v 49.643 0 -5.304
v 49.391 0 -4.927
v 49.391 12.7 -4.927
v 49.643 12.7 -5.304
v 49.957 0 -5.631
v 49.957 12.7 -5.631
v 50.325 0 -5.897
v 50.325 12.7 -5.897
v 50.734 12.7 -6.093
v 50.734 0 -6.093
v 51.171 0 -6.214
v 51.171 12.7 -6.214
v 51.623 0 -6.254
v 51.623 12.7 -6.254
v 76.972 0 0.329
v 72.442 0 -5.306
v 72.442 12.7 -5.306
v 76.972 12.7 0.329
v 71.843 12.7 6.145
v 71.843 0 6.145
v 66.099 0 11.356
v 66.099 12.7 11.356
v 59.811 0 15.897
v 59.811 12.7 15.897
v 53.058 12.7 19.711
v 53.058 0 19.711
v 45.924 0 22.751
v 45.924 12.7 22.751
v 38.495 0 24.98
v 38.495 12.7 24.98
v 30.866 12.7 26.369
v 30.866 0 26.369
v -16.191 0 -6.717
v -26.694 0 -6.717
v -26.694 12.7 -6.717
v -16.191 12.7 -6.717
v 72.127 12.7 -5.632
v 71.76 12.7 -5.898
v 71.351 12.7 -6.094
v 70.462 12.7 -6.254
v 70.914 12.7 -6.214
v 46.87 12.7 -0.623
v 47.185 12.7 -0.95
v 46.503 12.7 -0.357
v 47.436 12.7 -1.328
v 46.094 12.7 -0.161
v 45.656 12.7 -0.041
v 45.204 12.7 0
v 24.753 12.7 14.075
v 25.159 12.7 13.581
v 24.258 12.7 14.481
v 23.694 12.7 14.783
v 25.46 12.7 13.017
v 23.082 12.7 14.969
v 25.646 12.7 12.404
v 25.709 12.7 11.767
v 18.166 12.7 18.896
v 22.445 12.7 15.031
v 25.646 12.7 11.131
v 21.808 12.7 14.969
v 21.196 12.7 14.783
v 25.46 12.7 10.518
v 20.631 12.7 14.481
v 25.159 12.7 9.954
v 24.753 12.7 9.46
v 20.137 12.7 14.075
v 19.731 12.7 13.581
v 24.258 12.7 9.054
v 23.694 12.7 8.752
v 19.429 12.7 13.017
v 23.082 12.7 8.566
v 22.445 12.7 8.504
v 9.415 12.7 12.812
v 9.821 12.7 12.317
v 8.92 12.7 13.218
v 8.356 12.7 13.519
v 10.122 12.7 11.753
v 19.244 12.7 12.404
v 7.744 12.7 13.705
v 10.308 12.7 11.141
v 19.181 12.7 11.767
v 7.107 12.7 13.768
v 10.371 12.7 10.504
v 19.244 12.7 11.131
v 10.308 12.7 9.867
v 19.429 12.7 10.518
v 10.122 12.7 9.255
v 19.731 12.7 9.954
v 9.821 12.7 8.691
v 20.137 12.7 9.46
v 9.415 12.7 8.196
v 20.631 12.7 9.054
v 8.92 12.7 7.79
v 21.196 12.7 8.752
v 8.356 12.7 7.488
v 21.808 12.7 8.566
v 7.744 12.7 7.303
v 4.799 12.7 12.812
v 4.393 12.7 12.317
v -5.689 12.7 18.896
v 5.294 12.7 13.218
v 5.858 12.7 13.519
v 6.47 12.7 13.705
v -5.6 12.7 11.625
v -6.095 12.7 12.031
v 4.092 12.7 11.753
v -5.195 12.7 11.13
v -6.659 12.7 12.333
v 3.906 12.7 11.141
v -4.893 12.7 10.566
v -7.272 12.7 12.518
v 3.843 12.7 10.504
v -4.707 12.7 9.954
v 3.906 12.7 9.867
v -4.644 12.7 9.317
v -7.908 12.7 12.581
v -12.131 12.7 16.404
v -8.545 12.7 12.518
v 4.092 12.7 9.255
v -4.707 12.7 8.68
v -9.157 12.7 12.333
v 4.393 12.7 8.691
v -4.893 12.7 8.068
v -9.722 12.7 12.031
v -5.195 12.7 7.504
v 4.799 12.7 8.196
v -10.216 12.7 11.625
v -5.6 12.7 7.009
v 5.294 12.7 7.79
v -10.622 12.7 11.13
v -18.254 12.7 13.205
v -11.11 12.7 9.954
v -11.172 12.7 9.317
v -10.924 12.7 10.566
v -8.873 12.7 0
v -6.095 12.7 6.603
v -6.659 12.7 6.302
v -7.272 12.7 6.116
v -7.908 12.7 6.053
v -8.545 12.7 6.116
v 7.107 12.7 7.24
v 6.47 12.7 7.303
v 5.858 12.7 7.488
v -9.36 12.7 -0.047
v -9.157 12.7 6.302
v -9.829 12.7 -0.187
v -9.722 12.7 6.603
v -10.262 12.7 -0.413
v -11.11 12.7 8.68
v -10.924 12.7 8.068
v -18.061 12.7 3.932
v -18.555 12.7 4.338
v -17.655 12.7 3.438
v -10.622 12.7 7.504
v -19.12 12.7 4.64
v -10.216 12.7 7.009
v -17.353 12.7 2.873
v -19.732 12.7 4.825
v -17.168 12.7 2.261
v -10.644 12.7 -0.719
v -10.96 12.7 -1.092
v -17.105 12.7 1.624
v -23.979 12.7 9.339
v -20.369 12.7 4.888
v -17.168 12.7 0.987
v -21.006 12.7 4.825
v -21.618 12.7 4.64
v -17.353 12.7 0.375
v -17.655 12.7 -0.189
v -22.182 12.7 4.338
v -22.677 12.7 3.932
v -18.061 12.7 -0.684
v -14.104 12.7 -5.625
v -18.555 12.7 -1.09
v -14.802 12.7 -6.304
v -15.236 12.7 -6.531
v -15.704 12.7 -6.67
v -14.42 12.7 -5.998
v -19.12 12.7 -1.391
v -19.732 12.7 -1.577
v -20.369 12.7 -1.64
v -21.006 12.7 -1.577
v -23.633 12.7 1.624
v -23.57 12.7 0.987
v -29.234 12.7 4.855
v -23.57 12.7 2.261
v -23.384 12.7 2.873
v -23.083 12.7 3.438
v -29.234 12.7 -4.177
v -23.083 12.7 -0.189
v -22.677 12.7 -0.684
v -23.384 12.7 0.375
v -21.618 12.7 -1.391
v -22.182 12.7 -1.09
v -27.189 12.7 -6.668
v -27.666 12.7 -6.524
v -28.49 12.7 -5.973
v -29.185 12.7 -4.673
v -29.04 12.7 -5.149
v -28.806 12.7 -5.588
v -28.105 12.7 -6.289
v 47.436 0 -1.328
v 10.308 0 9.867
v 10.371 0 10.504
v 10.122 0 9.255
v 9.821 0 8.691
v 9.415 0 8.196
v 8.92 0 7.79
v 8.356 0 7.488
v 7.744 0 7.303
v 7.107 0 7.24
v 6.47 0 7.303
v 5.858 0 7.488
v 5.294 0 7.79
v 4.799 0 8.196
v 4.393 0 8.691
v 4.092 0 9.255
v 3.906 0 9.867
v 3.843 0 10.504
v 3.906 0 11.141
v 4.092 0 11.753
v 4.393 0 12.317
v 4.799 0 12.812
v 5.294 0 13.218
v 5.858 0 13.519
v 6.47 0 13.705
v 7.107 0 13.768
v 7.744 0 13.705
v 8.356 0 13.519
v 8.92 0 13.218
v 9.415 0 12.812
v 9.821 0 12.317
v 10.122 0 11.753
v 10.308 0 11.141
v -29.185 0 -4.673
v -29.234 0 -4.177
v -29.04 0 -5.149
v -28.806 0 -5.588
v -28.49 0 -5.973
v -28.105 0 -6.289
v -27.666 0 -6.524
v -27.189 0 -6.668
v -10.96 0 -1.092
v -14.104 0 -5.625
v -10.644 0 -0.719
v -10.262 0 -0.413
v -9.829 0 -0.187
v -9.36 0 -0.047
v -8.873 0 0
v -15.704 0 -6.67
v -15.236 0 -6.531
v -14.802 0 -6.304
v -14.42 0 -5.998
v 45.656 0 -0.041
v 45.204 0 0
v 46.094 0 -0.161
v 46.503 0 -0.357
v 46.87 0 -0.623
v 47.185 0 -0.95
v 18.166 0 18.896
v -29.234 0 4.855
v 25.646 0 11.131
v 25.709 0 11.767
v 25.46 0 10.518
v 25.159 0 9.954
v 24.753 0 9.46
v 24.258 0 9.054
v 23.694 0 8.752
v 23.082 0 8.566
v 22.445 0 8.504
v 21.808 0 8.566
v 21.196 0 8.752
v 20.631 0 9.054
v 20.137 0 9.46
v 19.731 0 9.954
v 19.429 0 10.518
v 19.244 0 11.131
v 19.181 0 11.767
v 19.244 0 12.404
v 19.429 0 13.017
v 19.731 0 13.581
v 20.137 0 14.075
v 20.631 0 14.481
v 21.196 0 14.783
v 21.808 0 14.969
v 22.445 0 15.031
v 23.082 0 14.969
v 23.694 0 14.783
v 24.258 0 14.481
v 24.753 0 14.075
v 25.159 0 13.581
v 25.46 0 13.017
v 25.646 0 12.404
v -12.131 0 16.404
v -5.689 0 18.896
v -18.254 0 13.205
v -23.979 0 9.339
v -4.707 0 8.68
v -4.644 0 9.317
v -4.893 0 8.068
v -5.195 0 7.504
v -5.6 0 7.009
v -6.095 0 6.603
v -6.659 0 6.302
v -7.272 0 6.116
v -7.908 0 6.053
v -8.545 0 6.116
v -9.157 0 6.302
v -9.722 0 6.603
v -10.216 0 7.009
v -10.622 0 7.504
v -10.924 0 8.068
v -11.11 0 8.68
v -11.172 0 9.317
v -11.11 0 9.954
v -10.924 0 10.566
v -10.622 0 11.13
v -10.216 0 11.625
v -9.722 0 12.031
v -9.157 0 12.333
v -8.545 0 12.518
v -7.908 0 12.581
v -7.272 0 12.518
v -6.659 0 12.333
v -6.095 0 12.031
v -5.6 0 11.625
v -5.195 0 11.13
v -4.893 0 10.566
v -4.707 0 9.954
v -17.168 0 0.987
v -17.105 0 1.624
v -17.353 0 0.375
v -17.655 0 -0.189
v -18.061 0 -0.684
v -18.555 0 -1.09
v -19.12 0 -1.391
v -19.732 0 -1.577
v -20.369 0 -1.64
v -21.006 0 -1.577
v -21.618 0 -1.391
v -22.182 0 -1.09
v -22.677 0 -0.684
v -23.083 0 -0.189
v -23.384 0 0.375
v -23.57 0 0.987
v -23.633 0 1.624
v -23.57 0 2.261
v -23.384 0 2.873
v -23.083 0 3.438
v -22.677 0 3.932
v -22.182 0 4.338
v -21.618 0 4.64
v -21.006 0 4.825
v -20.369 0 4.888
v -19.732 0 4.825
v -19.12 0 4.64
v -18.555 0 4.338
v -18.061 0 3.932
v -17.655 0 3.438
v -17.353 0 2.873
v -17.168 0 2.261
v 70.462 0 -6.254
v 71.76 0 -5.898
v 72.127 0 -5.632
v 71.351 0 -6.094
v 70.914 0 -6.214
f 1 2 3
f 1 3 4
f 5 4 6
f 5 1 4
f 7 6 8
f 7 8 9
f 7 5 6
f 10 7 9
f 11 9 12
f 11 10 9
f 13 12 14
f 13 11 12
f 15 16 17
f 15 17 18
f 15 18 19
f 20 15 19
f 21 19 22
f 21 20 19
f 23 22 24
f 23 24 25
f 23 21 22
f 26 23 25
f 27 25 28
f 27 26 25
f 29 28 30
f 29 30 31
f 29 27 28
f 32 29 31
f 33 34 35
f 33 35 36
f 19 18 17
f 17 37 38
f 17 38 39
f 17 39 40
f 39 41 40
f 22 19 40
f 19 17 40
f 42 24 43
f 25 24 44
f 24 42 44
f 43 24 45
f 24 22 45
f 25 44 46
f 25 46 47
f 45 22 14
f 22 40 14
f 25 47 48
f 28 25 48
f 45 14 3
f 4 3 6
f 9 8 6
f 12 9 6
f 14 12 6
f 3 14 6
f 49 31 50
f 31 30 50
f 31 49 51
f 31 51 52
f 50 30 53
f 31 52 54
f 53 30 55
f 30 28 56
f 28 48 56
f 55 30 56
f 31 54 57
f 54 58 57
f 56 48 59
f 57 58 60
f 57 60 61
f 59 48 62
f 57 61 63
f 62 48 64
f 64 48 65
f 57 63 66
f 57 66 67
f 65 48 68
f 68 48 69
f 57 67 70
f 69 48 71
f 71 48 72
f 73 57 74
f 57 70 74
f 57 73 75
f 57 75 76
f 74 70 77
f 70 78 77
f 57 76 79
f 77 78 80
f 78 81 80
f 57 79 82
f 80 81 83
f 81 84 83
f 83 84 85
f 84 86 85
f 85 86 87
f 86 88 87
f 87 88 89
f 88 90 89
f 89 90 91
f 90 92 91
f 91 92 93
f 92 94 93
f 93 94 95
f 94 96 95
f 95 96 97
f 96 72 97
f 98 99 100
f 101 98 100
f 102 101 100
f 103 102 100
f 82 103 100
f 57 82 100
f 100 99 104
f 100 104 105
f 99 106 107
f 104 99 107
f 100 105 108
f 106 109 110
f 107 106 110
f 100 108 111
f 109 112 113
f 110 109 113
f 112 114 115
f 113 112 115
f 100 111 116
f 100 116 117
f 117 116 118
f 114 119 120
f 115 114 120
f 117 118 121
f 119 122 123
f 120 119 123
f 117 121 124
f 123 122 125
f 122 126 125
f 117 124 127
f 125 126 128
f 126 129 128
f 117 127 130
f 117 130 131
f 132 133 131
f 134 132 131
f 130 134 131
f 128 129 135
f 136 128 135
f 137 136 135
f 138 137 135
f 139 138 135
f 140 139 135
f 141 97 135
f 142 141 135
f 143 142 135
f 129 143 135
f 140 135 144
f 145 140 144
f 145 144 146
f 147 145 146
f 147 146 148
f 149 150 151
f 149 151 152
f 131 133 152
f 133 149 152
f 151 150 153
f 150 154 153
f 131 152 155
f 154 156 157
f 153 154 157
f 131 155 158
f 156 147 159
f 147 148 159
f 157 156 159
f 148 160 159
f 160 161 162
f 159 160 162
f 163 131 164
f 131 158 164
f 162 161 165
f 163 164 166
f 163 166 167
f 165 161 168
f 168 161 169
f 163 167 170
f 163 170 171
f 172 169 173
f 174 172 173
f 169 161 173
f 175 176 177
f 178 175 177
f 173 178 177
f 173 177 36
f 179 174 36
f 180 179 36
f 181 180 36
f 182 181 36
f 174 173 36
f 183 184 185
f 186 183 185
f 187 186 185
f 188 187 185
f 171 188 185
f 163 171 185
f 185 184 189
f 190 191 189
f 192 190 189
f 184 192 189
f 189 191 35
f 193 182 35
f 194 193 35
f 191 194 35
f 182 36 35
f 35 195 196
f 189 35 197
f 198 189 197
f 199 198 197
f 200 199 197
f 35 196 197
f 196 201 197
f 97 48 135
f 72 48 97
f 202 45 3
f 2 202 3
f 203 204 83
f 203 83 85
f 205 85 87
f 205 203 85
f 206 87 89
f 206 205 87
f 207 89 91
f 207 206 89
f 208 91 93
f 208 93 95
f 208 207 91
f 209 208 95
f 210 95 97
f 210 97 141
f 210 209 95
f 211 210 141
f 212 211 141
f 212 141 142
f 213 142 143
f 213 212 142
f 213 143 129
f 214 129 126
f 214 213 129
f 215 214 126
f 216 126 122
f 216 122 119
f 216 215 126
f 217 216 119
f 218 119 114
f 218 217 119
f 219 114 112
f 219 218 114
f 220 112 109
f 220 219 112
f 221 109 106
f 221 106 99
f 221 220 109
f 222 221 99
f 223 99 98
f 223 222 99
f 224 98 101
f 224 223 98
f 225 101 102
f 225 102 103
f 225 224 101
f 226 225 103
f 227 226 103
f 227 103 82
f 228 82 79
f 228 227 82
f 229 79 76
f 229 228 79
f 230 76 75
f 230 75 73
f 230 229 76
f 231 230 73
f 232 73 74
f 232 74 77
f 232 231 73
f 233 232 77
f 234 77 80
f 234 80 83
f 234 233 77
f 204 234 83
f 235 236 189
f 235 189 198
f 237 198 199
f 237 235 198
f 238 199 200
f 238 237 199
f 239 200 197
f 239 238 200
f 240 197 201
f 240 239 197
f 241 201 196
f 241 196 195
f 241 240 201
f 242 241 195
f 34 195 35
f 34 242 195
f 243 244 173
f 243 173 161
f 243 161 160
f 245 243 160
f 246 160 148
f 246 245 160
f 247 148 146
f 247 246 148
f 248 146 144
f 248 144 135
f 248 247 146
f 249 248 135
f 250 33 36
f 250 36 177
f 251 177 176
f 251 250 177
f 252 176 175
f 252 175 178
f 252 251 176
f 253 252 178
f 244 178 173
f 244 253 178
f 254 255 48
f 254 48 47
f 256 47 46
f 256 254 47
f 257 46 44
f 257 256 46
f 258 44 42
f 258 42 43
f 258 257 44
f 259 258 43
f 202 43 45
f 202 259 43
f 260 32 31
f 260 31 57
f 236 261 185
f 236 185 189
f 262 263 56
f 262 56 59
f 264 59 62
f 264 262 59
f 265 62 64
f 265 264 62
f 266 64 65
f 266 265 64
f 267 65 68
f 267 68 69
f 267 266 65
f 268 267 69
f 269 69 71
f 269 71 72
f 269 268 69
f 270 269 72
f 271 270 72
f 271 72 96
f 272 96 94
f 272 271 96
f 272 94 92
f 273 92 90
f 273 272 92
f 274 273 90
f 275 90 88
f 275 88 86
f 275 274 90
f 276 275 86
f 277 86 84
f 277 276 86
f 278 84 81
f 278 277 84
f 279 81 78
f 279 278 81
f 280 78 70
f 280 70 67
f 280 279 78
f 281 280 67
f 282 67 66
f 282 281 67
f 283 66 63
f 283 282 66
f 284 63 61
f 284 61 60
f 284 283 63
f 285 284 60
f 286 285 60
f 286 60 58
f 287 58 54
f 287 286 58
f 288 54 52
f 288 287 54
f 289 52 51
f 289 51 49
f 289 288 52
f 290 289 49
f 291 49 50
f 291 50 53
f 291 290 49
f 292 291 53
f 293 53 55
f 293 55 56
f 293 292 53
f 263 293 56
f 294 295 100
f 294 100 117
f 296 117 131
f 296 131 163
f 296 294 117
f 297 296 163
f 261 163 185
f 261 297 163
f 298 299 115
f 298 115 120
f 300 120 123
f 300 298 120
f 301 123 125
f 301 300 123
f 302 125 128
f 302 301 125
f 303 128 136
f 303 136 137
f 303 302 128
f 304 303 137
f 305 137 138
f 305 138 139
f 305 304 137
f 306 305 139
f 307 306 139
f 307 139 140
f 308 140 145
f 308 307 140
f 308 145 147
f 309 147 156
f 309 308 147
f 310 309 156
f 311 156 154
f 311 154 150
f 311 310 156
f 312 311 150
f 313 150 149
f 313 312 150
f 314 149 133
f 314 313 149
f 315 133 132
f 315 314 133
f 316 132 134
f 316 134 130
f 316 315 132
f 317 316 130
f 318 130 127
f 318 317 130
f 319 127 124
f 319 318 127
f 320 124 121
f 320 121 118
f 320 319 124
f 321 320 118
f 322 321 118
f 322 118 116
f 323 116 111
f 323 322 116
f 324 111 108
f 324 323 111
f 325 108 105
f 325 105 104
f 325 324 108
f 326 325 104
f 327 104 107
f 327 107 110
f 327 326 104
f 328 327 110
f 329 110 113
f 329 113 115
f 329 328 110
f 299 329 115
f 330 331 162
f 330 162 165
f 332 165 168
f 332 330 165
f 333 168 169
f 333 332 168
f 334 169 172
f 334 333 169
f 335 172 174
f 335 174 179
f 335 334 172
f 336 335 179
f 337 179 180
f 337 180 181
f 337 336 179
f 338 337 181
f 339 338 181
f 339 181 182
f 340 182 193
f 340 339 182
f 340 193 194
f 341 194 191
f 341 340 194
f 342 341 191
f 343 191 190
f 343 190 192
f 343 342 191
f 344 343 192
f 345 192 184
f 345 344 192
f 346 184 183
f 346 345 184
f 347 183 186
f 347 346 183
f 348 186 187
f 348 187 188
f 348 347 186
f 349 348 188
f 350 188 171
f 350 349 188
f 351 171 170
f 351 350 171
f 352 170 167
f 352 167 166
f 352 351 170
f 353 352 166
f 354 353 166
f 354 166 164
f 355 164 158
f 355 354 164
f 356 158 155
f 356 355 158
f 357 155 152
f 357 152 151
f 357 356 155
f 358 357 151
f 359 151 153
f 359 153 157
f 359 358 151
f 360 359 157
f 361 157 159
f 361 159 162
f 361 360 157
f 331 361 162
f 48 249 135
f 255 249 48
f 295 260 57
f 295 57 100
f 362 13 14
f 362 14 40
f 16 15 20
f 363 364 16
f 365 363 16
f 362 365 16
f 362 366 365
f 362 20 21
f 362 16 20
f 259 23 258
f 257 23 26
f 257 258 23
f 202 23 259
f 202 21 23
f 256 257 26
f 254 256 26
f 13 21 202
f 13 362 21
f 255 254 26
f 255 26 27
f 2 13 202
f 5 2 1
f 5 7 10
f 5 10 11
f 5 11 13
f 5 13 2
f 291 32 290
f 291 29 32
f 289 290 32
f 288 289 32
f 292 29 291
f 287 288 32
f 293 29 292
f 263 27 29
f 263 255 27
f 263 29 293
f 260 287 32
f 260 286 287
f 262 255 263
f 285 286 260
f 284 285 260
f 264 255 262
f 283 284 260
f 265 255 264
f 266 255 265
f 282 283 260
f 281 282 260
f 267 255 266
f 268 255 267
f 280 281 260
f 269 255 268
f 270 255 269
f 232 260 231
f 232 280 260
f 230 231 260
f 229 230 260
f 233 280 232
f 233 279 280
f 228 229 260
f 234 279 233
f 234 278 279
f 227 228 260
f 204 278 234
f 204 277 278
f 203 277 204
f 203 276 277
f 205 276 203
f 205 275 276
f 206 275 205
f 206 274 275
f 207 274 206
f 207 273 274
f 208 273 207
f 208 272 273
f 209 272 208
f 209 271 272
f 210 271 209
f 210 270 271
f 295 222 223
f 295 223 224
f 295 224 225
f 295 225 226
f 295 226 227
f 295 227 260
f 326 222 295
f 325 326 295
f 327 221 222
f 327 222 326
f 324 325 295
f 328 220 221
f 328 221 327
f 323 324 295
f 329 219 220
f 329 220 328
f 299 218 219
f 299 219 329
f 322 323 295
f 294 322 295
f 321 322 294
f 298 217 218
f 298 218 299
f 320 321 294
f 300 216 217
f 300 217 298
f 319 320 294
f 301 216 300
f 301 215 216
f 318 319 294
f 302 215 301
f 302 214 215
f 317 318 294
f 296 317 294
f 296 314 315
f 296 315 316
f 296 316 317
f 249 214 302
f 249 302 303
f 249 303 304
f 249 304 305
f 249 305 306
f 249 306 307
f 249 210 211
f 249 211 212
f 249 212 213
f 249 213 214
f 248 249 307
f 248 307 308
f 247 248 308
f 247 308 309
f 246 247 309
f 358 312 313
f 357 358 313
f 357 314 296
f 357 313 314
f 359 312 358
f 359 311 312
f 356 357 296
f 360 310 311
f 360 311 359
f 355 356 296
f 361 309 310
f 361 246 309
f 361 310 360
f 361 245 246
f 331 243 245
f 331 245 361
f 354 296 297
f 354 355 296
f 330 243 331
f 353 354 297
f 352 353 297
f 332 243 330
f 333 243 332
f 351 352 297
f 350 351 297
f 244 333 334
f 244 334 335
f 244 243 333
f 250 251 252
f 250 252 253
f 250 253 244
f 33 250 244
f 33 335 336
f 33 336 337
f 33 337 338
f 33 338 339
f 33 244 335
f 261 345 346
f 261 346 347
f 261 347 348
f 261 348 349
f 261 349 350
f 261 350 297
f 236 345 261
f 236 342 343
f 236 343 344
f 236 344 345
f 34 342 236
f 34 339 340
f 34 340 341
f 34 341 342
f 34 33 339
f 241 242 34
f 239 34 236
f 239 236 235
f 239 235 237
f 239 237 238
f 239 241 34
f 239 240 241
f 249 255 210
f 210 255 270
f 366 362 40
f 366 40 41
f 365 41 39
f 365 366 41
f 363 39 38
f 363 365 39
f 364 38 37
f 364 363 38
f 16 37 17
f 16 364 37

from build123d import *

# Parameters (mm, degrees)
SKETCH1_R           = 3.2639
BOSS_EXTRUDE1_DEPTH = 12.7


with BuildPart() as part:
    # Sketch1 → Boss-Extrude1 (new body)
    with BuildSketch(Plane(origin=(0, 0, 0), x_dir=(1, 0, 0), z_dir=(0, 1, 0))):
        with BuildLine():
            Line((-8.873253367, 0), (45.204292469, 0))
            ThreePointArc((45.204292469, 0), (46.502747155, 0.356971043), (47.436232768, 1.327546907))
            Line((47.436232768, 1.327546907), (49.391348597, 4.926615465))
            ThreePointArc((49.391348597, 4.926615465), (50.324834209, 5.897191329), (51.623288895, 6.254162372))
            Line((51.623288895, 6.254162372), (70.462087223, 6.254162372))
            ThreePointArc((70.462087223, 6.254162372), (71.559520533, 6.004847887), (72.441516032, 5.305847513))
            Line((72.441516032, 5.305847513), (76.972410672, -0.328799158))
            ThreePointArc((76.972410672, -0.328799158), (56.487992256, -17.897771795), (30.865519551, -26.369435729))
            Line((30.865519551, -26.369435729), (18.165519551, -18.896027316))
            Line((18.165519551, -18.896027316), (-5.688817186, -18.896027316))
            ThreePointArc((-5.688817186, -18.896027316), (-18.253794481, -13.20459823), (-29.23375861, -4.855262498))
            Line((-29.23375861, -4.855262498), (-29.23375861, 4.177286104))
            ThreePointArc((-29.23375861, 4.177286104), (-28.489809834, 5.973337328), (-26.69375861, 6.717286104))
            Line((-26.69375861, 6.717286104), (-16.191261416, 6.717286104))
            ThreePointArc((-16.191261416, 6.717286104), (-15.013419953, 6.427683732), (-14.10416564, 5.624915621))
            Line((-14.10416564, 5.624915621), (-10.960349143, 1.092370482))
            ThreePointArc((-10.960349143, 1.092370482), (-10.05109483, 0.289602371), (-8.873253367, 0))
        make_face()
        with Locations((-20.368787798, -1.624222444)):
            Circle(SKETCH1_R, mode=Mode.SUBTRACT)
        with Locations((-7.908365266, -9.317144856)):
            Circle(SKETCH1_R, mode=Mode.SUBTRACT)
        with Locations((7.107001098, -10.503835127)):
            Circle(SKETCH1_R, mode=Mode.SUBTRACT)
        with Locations((22.444824189, -11.767482364)):
            Circle(SKETCH1_R, mode=Mode.SUBTRACT)
    extrude(amount=BOSS_EXTRUDE1_DEPTH)


solid = part.part
